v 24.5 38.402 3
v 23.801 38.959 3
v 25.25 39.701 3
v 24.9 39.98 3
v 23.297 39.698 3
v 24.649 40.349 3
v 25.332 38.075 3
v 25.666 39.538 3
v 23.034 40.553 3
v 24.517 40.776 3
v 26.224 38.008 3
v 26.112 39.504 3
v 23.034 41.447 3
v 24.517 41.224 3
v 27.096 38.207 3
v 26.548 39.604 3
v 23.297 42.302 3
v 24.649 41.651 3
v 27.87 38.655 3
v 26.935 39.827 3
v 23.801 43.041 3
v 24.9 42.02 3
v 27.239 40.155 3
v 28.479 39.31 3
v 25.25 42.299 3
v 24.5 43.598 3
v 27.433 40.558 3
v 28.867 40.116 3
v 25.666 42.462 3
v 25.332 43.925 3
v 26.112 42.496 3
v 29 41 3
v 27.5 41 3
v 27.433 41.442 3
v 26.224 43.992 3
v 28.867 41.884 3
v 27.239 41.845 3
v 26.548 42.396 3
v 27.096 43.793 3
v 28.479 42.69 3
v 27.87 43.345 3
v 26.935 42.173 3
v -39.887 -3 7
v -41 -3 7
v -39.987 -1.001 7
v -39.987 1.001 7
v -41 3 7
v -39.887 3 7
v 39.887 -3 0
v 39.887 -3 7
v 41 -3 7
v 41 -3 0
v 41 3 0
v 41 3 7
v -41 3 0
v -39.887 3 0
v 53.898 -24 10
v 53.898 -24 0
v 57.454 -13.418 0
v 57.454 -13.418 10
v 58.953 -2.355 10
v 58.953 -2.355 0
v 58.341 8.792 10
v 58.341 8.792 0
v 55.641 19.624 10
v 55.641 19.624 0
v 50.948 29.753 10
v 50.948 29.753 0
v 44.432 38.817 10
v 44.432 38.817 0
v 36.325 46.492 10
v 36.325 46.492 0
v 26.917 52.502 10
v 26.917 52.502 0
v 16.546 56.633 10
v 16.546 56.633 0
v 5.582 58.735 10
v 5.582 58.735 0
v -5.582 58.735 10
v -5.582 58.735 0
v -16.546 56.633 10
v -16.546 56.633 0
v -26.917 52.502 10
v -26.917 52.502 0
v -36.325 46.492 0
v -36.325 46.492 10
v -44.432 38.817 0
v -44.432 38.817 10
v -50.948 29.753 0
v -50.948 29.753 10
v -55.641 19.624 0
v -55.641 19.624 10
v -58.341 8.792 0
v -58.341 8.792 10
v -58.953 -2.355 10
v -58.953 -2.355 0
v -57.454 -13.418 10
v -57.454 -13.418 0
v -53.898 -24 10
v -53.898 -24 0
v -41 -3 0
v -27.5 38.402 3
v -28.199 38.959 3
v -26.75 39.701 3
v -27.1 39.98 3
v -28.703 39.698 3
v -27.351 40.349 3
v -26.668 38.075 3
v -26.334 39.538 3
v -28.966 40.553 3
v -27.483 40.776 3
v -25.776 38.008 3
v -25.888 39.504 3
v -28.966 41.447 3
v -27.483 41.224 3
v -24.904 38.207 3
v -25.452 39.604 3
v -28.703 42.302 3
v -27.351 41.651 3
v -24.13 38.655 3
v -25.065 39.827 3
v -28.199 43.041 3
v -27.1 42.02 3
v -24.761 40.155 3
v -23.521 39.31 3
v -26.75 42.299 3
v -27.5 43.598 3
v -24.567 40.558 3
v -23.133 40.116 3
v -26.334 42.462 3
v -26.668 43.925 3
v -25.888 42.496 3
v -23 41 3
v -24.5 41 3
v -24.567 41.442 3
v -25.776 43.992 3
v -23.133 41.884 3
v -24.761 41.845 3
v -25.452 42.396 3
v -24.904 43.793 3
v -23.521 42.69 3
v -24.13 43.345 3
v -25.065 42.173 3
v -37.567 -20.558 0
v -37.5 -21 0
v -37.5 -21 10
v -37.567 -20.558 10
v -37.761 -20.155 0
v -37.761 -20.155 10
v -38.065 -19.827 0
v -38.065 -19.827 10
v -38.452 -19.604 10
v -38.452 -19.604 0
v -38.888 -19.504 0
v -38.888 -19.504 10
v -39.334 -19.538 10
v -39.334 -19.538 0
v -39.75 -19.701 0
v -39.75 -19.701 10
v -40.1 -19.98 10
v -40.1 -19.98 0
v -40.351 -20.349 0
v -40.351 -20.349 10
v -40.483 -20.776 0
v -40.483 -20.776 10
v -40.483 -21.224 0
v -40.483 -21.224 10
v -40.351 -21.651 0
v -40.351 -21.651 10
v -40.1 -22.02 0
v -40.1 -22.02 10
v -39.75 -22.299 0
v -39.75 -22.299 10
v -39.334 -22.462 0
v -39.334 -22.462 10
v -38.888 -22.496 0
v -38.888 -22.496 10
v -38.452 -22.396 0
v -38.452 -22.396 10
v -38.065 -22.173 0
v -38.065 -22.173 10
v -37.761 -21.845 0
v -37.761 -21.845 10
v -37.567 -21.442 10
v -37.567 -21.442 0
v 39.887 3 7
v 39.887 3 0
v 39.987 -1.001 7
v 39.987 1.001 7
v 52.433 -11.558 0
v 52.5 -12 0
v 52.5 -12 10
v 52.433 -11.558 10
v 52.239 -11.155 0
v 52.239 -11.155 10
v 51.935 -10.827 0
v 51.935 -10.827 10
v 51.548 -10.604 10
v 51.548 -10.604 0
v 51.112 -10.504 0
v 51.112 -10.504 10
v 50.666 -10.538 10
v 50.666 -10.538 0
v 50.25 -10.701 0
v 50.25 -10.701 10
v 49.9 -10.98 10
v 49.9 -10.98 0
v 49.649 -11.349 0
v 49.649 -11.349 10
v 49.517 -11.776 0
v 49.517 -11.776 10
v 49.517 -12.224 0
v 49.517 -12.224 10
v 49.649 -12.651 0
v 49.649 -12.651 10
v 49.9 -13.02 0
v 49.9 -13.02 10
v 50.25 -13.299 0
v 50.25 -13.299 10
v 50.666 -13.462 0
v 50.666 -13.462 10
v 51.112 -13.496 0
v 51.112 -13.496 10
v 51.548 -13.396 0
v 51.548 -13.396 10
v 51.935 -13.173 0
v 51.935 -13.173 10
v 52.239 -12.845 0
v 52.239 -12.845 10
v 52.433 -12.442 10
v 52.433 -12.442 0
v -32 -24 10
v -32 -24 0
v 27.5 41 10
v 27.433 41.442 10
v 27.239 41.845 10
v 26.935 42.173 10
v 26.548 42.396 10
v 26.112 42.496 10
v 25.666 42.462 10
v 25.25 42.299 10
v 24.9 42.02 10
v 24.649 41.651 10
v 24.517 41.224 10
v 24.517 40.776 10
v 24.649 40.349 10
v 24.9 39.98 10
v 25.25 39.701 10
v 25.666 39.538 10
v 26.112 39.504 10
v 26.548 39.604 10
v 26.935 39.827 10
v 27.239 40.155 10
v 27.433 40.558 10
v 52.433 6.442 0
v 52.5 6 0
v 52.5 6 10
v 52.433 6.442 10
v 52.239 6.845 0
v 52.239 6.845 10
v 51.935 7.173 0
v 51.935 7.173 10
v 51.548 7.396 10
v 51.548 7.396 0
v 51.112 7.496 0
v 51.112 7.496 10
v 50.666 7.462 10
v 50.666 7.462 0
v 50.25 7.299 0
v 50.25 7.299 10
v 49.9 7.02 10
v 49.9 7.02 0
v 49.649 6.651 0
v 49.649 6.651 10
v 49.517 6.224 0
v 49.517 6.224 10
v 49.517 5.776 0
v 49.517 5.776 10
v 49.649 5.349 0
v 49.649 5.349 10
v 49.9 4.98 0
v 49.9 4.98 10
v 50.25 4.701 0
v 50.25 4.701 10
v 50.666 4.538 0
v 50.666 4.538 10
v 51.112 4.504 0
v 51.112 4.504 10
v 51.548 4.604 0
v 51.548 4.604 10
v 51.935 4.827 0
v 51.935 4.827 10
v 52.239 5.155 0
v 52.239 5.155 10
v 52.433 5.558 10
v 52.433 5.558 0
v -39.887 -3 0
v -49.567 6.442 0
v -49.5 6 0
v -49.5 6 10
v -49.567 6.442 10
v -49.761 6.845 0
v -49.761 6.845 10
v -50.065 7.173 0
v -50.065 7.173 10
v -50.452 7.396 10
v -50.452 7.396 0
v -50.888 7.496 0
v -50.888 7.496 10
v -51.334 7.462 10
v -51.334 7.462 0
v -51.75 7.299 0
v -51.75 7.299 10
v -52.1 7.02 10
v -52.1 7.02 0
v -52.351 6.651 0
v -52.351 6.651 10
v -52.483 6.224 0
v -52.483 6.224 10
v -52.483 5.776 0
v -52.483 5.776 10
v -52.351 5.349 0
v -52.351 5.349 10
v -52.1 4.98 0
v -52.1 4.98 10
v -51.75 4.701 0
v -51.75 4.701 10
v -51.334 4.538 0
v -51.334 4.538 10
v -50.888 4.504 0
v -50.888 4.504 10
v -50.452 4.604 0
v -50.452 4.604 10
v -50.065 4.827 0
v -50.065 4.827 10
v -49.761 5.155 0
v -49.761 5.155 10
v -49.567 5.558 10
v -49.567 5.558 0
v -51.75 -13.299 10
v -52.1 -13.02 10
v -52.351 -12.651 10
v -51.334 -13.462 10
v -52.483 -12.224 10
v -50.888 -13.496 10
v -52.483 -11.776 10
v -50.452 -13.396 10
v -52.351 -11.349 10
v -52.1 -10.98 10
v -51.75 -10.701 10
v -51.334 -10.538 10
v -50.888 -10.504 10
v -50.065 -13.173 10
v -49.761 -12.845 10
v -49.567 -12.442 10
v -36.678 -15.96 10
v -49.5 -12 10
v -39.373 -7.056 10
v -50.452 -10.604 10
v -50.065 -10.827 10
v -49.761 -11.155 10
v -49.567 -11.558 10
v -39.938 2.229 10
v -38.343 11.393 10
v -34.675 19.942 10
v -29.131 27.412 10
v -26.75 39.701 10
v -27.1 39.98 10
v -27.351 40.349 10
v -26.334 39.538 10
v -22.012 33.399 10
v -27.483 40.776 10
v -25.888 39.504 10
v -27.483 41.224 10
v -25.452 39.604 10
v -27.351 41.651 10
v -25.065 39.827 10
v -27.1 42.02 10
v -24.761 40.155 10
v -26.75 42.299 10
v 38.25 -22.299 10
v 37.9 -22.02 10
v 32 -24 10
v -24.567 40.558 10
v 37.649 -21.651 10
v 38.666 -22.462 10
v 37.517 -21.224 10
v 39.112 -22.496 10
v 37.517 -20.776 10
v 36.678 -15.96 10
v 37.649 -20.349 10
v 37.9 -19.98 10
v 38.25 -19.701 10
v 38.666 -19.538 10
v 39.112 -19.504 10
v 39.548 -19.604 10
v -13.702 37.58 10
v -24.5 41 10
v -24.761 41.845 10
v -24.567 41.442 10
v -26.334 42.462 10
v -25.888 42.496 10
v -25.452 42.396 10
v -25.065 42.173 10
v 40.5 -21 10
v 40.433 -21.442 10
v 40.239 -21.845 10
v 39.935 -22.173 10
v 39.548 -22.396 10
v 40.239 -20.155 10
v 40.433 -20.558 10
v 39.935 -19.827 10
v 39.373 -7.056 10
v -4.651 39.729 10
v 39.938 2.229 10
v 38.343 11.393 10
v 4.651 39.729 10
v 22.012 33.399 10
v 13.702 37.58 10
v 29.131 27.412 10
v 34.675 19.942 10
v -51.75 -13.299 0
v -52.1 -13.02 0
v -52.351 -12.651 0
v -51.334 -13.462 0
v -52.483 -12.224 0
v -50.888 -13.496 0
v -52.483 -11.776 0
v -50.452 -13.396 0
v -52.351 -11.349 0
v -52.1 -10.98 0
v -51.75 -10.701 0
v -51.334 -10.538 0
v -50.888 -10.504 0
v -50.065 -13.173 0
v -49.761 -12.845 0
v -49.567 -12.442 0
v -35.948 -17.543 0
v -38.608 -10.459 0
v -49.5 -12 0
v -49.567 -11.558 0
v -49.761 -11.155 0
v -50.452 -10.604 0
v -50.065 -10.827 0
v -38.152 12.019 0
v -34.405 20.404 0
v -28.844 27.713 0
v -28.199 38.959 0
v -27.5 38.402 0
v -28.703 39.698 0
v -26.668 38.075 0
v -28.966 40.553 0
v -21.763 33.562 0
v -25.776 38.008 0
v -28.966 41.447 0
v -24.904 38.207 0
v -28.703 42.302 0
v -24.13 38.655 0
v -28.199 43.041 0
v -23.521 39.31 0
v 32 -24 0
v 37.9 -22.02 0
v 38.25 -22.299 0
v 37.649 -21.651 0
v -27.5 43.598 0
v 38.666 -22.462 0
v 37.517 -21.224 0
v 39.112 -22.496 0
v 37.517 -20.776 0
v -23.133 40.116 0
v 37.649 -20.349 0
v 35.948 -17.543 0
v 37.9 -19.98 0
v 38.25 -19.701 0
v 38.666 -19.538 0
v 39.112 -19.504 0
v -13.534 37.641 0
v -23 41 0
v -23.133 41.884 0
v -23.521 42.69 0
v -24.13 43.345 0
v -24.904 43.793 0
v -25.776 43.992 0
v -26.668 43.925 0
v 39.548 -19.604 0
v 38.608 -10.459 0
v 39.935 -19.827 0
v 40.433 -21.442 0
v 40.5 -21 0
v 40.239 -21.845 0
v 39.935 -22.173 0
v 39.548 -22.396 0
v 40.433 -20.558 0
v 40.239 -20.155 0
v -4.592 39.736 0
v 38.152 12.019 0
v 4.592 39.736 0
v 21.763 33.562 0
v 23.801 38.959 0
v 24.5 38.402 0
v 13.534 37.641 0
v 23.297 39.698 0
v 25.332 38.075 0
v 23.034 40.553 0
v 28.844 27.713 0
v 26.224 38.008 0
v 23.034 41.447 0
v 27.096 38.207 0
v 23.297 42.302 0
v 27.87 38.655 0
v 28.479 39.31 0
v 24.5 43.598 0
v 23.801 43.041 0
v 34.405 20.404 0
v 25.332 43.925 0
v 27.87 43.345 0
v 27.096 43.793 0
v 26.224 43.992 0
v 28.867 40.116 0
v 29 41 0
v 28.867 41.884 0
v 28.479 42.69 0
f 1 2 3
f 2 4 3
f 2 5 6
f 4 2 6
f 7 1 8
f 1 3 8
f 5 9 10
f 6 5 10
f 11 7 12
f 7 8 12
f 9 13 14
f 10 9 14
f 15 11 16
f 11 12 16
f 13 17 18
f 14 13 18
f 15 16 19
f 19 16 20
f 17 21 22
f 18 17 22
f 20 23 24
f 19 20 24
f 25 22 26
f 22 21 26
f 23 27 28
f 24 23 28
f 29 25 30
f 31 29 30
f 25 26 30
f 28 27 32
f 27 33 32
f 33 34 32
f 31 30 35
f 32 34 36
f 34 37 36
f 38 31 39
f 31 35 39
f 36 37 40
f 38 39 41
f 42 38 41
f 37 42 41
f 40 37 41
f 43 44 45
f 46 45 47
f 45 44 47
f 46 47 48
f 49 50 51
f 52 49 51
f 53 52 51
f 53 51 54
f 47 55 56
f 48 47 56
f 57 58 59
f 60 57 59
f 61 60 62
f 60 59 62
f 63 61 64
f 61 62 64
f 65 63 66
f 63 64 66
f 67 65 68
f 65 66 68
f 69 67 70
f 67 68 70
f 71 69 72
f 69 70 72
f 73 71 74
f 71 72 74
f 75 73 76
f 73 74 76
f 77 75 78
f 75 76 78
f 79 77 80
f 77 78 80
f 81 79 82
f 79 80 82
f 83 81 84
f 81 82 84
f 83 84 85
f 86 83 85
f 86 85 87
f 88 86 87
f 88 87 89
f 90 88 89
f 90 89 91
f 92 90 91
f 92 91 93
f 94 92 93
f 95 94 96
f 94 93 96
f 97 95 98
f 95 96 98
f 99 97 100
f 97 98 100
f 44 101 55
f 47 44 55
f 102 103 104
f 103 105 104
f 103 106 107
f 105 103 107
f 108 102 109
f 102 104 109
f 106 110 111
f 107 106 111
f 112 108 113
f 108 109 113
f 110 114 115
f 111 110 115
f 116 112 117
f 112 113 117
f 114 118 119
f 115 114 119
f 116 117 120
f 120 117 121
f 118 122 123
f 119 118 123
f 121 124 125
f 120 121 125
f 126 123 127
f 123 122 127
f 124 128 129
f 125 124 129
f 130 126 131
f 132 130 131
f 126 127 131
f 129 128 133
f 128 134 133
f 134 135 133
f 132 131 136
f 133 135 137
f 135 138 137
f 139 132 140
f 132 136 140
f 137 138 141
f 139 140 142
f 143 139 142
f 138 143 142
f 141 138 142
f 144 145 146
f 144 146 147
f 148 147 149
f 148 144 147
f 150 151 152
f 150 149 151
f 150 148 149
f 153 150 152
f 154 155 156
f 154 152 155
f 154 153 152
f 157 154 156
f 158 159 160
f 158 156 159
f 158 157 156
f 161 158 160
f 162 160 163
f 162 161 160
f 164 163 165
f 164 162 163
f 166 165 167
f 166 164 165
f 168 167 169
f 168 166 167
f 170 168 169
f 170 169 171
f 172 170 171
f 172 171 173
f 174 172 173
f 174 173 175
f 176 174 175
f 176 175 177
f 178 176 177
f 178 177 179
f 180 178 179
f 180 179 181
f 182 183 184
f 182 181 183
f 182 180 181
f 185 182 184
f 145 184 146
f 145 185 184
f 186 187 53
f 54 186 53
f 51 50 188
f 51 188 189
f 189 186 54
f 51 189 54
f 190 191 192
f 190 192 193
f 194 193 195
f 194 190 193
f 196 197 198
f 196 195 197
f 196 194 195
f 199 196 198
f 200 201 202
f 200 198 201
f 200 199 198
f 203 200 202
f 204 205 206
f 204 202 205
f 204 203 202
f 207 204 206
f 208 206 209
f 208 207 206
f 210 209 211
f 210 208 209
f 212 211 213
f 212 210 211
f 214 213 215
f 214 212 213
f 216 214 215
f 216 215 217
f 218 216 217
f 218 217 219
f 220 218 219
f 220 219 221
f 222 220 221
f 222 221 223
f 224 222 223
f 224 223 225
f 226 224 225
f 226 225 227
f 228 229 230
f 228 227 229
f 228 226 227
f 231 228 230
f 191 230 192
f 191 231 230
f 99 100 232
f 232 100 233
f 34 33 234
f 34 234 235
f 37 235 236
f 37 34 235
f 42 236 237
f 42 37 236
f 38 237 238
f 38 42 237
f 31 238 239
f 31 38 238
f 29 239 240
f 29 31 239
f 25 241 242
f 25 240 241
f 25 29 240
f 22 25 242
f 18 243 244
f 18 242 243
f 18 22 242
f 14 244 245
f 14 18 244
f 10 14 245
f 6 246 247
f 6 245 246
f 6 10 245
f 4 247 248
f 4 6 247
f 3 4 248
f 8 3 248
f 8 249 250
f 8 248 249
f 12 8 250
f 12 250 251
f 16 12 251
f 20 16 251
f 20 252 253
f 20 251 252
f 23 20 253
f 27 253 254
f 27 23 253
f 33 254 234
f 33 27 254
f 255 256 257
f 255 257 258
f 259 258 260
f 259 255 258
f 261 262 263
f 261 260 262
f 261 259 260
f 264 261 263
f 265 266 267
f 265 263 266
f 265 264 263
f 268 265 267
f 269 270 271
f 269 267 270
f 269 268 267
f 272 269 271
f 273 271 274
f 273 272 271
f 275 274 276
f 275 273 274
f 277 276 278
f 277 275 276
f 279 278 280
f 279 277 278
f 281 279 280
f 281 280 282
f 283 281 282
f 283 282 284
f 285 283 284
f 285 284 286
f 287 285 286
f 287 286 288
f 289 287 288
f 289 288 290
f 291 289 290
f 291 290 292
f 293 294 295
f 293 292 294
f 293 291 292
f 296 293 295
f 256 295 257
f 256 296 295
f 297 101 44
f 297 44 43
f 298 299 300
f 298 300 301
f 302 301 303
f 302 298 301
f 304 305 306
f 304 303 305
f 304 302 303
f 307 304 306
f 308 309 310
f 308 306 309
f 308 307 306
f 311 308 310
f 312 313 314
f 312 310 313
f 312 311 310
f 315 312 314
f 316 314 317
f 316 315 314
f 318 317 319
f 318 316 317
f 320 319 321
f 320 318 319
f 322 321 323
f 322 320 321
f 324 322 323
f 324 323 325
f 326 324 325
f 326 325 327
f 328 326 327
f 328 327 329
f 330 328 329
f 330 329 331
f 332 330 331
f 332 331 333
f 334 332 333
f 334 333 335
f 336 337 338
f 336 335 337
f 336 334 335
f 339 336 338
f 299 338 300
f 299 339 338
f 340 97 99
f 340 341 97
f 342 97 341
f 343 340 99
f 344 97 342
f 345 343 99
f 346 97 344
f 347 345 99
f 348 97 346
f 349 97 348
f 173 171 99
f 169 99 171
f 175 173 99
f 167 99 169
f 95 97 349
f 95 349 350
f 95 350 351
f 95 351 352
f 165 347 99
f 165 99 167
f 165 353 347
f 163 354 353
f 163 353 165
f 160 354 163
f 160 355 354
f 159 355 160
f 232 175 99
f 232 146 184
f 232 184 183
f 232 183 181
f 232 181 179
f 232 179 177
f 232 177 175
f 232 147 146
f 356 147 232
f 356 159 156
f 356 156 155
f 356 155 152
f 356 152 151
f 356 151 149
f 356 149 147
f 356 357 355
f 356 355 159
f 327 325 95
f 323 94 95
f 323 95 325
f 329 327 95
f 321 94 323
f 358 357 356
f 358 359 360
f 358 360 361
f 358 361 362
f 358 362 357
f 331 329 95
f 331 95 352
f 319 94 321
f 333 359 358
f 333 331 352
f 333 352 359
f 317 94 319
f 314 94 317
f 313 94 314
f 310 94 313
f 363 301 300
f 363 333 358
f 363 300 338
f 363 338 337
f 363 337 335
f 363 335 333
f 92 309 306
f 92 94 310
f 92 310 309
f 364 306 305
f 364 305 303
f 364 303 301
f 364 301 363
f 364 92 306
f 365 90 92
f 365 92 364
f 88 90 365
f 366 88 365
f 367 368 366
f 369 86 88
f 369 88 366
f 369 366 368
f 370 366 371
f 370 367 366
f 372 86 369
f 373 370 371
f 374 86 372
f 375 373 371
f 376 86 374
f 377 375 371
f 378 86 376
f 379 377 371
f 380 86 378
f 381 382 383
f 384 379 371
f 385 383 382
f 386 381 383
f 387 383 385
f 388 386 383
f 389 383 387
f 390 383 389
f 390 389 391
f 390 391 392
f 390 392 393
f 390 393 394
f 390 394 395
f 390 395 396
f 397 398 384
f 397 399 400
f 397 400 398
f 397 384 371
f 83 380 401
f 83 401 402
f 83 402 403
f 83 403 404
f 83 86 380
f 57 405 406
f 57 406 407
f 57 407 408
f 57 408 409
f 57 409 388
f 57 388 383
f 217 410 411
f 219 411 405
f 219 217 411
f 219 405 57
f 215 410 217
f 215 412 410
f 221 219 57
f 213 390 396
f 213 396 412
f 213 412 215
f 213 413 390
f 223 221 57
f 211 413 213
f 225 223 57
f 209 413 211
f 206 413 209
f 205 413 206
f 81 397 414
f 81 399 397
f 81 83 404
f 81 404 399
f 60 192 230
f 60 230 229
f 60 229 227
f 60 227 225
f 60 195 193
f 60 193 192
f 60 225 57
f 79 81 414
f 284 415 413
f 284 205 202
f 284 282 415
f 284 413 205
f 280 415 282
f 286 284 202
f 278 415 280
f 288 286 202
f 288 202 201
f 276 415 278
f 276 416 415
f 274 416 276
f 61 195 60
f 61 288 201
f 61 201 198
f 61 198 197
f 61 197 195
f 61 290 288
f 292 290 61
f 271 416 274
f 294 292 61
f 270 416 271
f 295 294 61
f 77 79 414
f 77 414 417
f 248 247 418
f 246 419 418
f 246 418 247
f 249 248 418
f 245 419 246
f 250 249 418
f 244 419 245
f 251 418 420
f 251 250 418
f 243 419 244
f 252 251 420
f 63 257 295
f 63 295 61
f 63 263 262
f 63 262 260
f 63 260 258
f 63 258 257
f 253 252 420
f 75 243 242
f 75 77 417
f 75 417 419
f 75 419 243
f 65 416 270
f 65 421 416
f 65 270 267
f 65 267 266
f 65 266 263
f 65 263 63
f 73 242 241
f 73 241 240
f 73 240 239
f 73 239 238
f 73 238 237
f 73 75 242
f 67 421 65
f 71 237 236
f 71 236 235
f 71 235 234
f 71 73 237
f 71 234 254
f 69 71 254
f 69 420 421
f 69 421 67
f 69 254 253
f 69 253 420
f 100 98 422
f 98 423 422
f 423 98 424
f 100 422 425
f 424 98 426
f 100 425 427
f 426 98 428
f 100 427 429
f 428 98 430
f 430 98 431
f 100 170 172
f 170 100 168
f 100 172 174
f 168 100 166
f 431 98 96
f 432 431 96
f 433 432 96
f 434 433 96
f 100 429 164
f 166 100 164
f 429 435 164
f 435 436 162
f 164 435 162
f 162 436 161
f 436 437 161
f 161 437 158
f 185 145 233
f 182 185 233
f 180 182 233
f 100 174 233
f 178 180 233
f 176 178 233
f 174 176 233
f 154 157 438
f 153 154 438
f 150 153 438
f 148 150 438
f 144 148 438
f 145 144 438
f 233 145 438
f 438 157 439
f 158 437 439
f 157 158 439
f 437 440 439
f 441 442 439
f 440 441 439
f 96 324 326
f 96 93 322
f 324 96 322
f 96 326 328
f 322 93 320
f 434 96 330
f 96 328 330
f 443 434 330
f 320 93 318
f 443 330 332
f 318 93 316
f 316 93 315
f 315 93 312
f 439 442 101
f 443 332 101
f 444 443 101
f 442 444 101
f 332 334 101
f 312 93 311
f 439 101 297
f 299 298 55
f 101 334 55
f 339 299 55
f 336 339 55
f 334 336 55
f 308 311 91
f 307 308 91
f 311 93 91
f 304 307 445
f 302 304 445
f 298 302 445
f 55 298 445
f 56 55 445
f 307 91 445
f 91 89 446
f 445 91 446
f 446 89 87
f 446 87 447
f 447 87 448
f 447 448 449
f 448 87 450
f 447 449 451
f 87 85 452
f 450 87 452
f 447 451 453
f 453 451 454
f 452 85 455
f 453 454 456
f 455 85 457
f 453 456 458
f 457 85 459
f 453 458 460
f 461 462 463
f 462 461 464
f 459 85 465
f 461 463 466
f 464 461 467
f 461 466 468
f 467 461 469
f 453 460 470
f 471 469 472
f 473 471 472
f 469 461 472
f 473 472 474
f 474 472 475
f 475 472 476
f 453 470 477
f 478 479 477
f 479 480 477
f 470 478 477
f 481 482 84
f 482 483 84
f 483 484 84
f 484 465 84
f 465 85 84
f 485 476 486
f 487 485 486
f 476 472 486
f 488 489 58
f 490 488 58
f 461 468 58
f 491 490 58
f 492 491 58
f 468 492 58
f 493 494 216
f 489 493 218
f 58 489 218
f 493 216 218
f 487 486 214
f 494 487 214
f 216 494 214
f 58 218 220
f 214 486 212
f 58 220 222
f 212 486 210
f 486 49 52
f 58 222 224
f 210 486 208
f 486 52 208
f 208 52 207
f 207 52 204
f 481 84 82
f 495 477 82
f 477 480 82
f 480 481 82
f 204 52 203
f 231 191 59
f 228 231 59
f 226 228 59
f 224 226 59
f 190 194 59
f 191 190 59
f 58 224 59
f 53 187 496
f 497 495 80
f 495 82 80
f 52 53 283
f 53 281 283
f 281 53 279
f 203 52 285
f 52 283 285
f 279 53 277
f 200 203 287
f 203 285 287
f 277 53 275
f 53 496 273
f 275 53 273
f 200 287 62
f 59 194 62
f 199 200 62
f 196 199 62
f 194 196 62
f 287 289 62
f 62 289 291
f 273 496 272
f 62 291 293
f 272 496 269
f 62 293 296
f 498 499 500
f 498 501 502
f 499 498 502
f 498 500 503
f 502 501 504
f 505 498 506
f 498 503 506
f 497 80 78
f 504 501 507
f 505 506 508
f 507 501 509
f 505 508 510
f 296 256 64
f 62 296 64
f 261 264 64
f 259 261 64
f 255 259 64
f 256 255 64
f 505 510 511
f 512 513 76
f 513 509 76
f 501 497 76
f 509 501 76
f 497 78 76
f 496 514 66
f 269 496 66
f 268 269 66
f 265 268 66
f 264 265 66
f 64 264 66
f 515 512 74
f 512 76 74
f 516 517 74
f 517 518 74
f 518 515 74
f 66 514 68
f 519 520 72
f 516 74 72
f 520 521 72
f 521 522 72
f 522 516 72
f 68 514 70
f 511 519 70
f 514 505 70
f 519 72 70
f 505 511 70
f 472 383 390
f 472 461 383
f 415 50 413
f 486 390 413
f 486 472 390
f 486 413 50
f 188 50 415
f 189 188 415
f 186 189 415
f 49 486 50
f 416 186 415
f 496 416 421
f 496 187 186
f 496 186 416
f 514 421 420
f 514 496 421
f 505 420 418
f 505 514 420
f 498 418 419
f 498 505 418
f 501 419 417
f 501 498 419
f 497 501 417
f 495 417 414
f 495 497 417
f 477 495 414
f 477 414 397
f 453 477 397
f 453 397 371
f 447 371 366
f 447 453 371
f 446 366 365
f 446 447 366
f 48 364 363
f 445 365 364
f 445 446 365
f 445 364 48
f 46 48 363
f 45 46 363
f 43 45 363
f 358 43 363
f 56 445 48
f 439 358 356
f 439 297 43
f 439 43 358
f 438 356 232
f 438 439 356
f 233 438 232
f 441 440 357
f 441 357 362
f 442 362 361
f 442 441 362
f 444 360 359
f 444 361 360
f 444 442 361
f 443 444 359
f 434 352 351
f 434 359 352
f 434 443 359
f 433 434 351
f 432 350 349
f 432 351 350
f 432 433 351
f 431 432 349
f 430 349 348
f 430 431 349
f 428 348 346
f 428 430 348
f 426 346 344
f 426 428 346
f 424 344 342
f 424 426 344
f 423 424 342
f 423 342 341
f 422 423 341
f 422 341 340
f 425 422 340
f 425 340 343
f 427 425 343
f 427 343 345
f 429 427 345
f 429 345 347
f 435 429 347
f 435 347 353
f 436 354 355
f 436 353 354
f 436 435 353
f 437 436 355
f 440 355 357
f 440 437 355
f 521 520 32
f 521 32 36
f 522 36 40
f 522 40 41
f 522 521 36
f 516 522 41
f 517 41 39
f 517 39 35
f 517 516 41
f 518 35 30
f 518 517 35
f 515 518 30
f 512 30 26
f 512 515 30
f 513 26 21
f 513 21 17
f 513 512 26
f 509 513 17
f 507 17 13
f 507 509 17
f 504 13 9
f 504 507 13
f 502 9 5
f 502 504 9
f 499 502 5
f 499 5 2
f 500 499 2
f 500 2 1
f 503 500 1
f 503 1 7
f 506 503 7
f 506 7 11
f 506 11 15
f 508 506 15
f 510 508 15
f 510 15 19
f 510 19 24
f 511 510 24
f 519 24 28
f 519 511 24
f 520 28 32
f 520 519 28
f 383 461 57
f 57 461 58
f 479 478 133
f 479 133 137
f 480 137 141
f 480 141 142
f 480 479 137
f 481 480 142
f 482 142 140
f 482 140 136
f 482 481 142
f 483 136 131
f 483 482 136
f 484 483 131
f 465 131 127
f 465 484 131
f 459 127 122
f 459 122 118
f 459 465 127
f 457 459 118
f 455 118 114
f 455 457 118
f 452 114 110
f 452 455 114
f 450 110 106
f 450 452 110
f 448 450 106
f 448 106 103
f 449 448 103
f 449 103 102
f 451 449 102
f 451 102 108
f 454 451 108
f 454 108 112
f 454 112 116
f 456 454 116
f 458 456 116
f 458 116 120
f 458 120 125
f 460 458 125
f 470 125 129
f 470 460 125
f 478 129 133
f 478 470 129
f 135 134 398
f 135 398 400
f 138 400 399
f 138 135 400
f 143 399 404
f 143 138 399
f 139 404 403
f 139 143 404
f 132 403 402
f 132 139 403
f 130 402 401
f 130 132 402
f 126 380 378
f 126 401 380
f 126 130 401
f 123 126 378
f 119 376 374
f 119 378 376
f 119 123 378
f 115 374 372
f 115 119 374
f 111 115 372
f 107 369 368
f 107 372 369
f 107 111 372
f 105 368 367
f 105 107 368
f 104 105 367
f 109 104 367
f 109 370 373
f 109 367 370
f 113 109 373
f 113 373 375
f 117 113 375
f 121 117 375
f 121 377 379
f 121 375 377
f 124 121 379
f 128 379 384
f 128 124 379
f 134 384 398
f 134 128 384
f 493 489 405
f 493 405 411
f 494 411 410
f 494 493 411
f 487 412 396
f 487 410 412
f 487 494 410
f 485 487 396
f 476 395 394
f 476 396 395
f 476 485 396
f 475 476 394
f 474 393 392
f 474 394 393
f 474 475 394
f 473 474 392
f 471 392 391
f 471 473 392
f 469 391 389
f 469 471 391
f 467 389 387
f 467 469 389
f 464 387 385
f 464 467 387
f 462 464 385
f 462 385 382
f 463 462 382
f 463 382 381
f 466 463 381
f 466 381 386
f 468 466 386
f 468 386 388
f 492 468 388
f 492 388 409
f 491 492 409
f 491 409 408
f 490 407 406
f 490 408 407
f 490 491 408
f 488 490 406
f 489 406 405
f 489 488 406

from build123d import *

# Parameters (mm, degrees)
BOX237_W           = 6
BOX237_H           = 6
BOX237_DEPTH       = 64
BOX236_W           = 6
BOX236_H           = 6
BOX236_DEPTH       = 64
CYLINDER1243_R     = 3
CYLINDER1243_DEPTH = 3
CYLINDER1242_R     = 3
CYLINDER1242_DEPTH = 3
CYLINDER1257_R     = 1.5
CYLINDER1257_DEPTH = 32
CYLINDER1256_R     = 1.5
CYLINDER1256_DEPTH = 32
CYLINDER1255_R     = 1.5
CYLINDER1255_DEPTH = 100
CYLINDER1254_R     = 1.5
CYLINDER1254_DEPTH = 100
CYLINDER1248_R     = 1.5
CYLINDER1248_DEPTH = 50
CYLINDER1250_R     = 1.5
CYLINDER1250_DEPTH = 50
CYLINDER1251_R     = 1.5
CYLINDER1251_DEPTH = 50
CYLINDER1249_R     = 1.5
CYLINDER1249_DEPTH = 50
CYLINDER1246_R     = 1.5
CYLINDER1246_DEPTH = 100
CYLINDER1247_R     = 1.5
CYLINDER1247_DEPTH = 100
CYLINDER1252_R     = 1.5
CYLINDER1252_DEPTH = 100
CYLINDER1253_R     = 1.5
CYLINDER1253_DEPTH = 100
BOX139_W           = 200
BOX139_H           = 100
BOX139_DEPTH       = 32
TUBE001_R          = 59
TUBE001_R_2        = 40
TUBE001_DEPTH      = 10


with BuildPart() as krychle237:
    # Box237 → Box237 (new body)
    with BuildSketch(Plane(origin=(87, -3, -93), x_dir=(1, 0, 0), z_dir=(0, 0, 1))):
        with Locations((3, 3)):
            Rectangle(BOX237_W, BOX237_H)
    extrude(amount=BOX237_DEPTH)


with BuildPart() as compound627:
    # Box236 → Box236 (new body)
    with BuildSketch(Plane(origin=(11, -3, -93), x_dir=(1, 0, 0), z_dir=(0, 0, 1))):
        with Locations((3, 3)):
            Rectangle(BOX236_W, BOX236_H)
    extrude(amount=BOX236_DEPTH)

    # Compound627: union Krychle237
    add(krychle237.part)


with BuildPart() as compound627_1:
    # Compound627 placement: moved
    add(compound627.part.moved(Location((-52, 0, 36))))


with BuildPart() as v_lec1243:
    # Cylinder1243 → Cylinder1243 (new body)
    with BuildSketch(Plane(origin=(78, 41, -42), x_dir=(1, 0, 0), z_dir=(0, 0, 1))):
        Circle(CYLINDER1243_R)
    extrude(amount=CYLINDER1243_DEPTH)


with BuildPart() as compound633:
    # Cylinder1242 → Cylinder1242 (new body)
    with BuildSketch(Plane(origin=(26, 41, -42), x_dir=(1, 0, 0), z_dir=(0, 0, 1))):
        Circle(CYLINDER1242_R)
    extrude(amount=CYLINDER1242_DEPTH)

    # Compound633: union Válec1243
    add(v_lec1243.part)


with BuildPart() as compound633_1:
    # Compound633 placement: moved
    add(compound633.part.moved(Location((-52, 0, 42))))


with BuildPart() as v_lec1257:
    # Cylinder1257 → Cylinder1257 (new body)
    with BuildSketch(Plane(origin=(78, 41, -42), x_dir=(1, 0, 0), z_dir=(0, 0, 1))):
        Circle(CYLINDER1257_R)
    extrude(amount=CYLINDER1257_DEPTH)


with BuildPart() as compound641:
    # Cylinder1256 → Cylinder1256 (new body)
    with BuildSketch(Plane(origin=(26, 41, -42), x_dir=(1, 0, 0), z_dir=(0, 0, 1))):
        Circle(CYLINDER1256_R)
    extrude(amount=CYLINDER1256_DEPTH)

    # Compound641: union Válec1257
    add(v_lec1257.part)


with BuildPart() as compound641_1:
    # Compound641 placement: moved
    add(compound641.part.moved(Location((-52, 0, 36))))


with BuildPart() as v_lec1255:
    # Cylinder1255 → Cylinder1255 (new body)
    with BuildSketch(Plane(origin=(14, 0, -60), x_dir=(1, 0, 0), z_dir=(0, 0, 1))):
        Circle(CYLINDER1255_R)
    extrude(amount=CYLINDER1255_DEPTH)


with BuildPart() as compound639:
    # Cylinder1254 → Cylinder1254 (new body)
    with BuildSketch(Plane(origin=(90, 0, -60), x_dir=(1, 0, 0), z_dir=(0, 0, 1))):
        Circle(CYLINDER1254_R)
    extrude(amount=CYLINDER1254_DEPTH)

    # Compound640: union Válec1255
    add(v_lec1255.part)


with BuildPart() as compound639_1:
    # Compound640 placement: moved
    add(compound639.part.moved(Location((-52, 0, 0))))

    # Compound639: union Compound641
    add(compound641_1.part)


with BuildPart() as v_lec1248:
    # Cylinder1248 → Cylinder1248 (new body)
    with BuildSketch(Plane(origin=(-51, 6, 0), x_dir=(1, 0, 0), z_dir=(0, 0, 1))):
        Circle(CYLINDER1248_R)
    extrude(amount=CYLINDER1248_DEPTH)


with BuildPart() as v_lec1250:
    # Cylinder1250 → Cylinder1250 (new body)
    with BuildSketch(Plane(origin=(-24, 18, 0), x_dir=(1, 0, 0), z_dir=(0, 0, 1))):
        Circle(CYLINDER1250_R)
    extrude(amount=CYLINDER1250_DEPTH)


with BuildPart() as v_lec1251:
    # Cylinder1251 → Cylinder1251 (new body)
    with BuildSketch(Plane(origin=(24, 18, 0), x_dir=(1, 0, 0), z_dir=(0, 0, 1))):
        Circle(CYLINDER1251_R)
    extrude(amount=CYLINDER1251_DEPTH)


with BuildPart() as compound637:
    # Cylinder1249 → Cylinder1249 (new body)
    with BuildSketch(Plane(origin=(51, 6, 0), x_dir=(1, 0, 0), z_dir=(0, 0, 1))):
        Circle(CYLINDER1249_R)
    extrude(amount=CYLINDER1249_DEPTH)

    # Compound637: union Válec1248, Válec1250, Válec1251
    add(v_lec1248.part)
    add(v_lec1250.part)
    add(v_lec1251.part)


with BuildPart() as v_lec1246:
    # Cylinder1246 → Cylinder1246 (new body)
    with BuildSketch(Plane(origin=(51, -12, 0), x_dir=(1, 0, 0), z_dir=(0, 0, 1))):
        Circle(CYLINDER1246_R)
    extrude(amount=CYLINDER1246_DEPTH)


with BuildPart() as compound636:
    # Cylinder1247 → Cylinder1247 (new body)
    with BuildSketch(Plane(origin=(-51, -12, 0), x_dir=(1, 0, 0), z_dir=(0, 0, 1))):
        Circle(CYLINDER1247_R)
    extrude(amount=CYLINDER1247_DEPTH)

    # Compound636: union Válec1246
    add(v_lec1246.part)


with BuildPart() as v_lec1252:
    # Cylinder1252 → Cylinder1252 (new body)
    with BuildSketch(Plane(origin=(39, -21, 0), x_dir=(1, 0, 0), z_dir=(0, 0, 1))):
        Circle(CYLINDER1252_R)
    extrude(amount=CYLINDER1252_DEPTH)


with BuildPart() as compound635:
    # Cylinder1253 → Cylinder1253 (new body)
    with BuildSketch(Plane(origin=(-39, -21, 0), x_dir=(1, 0, 0), z_dir=(0, 0, 1))):
        Circle(CYLINDER1253_R)
    extrude(amount=CYLINDER1253_DEPTH)

    # Compound638: union Válec1252
    add(v_lec1252.part)

    # Compound635: union Compound637, Compound636
    add(compound637.part)
    add(compound636.part)


with BuildPart() as compound635_1:
    # Compound635 placement: moved
    add(compound635.part.moved(Location((0, 0, -10))))


with BuildPart() as krychle139:
    # Box139 → Box139 (new body)
    with BuildSketch(Plane(origin=(-100, -124, 0), x_dir=(1, 0, 0), z_dir=(0, 0, 1))):
        with Locations((100, 50)):
            Rectangle(BOX139_W, BOX139_H)
    extrude(amount=BOX139_DEPTH)


with BuildPart() as cut198:
    # Tube001 → Tube001 (new body)
    with BuildSketch(Plane.XY):
        Circle(TUBE001_R)
        Circle(TUBE001_R_2, mode=Mode.SUBTRACT)
    extrude(amount=TUBE001_DEPTH)

    # Cut191: cut Krychle139
    add(krychle139.part, mode=Mode.SUBTRACT)

    # Cut194: cut Compound635
    add(compound635_1.part, mode=Mode.SUBTRACT)

    # Cut195: cut Compound639
    add(compound639_1.part, mode=Mode.SUBTRACT)

    # Cut196: cut Compound633
    add(compound633_1.part, mode=Mode.SUBTRACT)

    # Cut198: cut Compound627
    add(compound627_1.part, mode=Mode.SUBTRACT)


solid = cut198.part
